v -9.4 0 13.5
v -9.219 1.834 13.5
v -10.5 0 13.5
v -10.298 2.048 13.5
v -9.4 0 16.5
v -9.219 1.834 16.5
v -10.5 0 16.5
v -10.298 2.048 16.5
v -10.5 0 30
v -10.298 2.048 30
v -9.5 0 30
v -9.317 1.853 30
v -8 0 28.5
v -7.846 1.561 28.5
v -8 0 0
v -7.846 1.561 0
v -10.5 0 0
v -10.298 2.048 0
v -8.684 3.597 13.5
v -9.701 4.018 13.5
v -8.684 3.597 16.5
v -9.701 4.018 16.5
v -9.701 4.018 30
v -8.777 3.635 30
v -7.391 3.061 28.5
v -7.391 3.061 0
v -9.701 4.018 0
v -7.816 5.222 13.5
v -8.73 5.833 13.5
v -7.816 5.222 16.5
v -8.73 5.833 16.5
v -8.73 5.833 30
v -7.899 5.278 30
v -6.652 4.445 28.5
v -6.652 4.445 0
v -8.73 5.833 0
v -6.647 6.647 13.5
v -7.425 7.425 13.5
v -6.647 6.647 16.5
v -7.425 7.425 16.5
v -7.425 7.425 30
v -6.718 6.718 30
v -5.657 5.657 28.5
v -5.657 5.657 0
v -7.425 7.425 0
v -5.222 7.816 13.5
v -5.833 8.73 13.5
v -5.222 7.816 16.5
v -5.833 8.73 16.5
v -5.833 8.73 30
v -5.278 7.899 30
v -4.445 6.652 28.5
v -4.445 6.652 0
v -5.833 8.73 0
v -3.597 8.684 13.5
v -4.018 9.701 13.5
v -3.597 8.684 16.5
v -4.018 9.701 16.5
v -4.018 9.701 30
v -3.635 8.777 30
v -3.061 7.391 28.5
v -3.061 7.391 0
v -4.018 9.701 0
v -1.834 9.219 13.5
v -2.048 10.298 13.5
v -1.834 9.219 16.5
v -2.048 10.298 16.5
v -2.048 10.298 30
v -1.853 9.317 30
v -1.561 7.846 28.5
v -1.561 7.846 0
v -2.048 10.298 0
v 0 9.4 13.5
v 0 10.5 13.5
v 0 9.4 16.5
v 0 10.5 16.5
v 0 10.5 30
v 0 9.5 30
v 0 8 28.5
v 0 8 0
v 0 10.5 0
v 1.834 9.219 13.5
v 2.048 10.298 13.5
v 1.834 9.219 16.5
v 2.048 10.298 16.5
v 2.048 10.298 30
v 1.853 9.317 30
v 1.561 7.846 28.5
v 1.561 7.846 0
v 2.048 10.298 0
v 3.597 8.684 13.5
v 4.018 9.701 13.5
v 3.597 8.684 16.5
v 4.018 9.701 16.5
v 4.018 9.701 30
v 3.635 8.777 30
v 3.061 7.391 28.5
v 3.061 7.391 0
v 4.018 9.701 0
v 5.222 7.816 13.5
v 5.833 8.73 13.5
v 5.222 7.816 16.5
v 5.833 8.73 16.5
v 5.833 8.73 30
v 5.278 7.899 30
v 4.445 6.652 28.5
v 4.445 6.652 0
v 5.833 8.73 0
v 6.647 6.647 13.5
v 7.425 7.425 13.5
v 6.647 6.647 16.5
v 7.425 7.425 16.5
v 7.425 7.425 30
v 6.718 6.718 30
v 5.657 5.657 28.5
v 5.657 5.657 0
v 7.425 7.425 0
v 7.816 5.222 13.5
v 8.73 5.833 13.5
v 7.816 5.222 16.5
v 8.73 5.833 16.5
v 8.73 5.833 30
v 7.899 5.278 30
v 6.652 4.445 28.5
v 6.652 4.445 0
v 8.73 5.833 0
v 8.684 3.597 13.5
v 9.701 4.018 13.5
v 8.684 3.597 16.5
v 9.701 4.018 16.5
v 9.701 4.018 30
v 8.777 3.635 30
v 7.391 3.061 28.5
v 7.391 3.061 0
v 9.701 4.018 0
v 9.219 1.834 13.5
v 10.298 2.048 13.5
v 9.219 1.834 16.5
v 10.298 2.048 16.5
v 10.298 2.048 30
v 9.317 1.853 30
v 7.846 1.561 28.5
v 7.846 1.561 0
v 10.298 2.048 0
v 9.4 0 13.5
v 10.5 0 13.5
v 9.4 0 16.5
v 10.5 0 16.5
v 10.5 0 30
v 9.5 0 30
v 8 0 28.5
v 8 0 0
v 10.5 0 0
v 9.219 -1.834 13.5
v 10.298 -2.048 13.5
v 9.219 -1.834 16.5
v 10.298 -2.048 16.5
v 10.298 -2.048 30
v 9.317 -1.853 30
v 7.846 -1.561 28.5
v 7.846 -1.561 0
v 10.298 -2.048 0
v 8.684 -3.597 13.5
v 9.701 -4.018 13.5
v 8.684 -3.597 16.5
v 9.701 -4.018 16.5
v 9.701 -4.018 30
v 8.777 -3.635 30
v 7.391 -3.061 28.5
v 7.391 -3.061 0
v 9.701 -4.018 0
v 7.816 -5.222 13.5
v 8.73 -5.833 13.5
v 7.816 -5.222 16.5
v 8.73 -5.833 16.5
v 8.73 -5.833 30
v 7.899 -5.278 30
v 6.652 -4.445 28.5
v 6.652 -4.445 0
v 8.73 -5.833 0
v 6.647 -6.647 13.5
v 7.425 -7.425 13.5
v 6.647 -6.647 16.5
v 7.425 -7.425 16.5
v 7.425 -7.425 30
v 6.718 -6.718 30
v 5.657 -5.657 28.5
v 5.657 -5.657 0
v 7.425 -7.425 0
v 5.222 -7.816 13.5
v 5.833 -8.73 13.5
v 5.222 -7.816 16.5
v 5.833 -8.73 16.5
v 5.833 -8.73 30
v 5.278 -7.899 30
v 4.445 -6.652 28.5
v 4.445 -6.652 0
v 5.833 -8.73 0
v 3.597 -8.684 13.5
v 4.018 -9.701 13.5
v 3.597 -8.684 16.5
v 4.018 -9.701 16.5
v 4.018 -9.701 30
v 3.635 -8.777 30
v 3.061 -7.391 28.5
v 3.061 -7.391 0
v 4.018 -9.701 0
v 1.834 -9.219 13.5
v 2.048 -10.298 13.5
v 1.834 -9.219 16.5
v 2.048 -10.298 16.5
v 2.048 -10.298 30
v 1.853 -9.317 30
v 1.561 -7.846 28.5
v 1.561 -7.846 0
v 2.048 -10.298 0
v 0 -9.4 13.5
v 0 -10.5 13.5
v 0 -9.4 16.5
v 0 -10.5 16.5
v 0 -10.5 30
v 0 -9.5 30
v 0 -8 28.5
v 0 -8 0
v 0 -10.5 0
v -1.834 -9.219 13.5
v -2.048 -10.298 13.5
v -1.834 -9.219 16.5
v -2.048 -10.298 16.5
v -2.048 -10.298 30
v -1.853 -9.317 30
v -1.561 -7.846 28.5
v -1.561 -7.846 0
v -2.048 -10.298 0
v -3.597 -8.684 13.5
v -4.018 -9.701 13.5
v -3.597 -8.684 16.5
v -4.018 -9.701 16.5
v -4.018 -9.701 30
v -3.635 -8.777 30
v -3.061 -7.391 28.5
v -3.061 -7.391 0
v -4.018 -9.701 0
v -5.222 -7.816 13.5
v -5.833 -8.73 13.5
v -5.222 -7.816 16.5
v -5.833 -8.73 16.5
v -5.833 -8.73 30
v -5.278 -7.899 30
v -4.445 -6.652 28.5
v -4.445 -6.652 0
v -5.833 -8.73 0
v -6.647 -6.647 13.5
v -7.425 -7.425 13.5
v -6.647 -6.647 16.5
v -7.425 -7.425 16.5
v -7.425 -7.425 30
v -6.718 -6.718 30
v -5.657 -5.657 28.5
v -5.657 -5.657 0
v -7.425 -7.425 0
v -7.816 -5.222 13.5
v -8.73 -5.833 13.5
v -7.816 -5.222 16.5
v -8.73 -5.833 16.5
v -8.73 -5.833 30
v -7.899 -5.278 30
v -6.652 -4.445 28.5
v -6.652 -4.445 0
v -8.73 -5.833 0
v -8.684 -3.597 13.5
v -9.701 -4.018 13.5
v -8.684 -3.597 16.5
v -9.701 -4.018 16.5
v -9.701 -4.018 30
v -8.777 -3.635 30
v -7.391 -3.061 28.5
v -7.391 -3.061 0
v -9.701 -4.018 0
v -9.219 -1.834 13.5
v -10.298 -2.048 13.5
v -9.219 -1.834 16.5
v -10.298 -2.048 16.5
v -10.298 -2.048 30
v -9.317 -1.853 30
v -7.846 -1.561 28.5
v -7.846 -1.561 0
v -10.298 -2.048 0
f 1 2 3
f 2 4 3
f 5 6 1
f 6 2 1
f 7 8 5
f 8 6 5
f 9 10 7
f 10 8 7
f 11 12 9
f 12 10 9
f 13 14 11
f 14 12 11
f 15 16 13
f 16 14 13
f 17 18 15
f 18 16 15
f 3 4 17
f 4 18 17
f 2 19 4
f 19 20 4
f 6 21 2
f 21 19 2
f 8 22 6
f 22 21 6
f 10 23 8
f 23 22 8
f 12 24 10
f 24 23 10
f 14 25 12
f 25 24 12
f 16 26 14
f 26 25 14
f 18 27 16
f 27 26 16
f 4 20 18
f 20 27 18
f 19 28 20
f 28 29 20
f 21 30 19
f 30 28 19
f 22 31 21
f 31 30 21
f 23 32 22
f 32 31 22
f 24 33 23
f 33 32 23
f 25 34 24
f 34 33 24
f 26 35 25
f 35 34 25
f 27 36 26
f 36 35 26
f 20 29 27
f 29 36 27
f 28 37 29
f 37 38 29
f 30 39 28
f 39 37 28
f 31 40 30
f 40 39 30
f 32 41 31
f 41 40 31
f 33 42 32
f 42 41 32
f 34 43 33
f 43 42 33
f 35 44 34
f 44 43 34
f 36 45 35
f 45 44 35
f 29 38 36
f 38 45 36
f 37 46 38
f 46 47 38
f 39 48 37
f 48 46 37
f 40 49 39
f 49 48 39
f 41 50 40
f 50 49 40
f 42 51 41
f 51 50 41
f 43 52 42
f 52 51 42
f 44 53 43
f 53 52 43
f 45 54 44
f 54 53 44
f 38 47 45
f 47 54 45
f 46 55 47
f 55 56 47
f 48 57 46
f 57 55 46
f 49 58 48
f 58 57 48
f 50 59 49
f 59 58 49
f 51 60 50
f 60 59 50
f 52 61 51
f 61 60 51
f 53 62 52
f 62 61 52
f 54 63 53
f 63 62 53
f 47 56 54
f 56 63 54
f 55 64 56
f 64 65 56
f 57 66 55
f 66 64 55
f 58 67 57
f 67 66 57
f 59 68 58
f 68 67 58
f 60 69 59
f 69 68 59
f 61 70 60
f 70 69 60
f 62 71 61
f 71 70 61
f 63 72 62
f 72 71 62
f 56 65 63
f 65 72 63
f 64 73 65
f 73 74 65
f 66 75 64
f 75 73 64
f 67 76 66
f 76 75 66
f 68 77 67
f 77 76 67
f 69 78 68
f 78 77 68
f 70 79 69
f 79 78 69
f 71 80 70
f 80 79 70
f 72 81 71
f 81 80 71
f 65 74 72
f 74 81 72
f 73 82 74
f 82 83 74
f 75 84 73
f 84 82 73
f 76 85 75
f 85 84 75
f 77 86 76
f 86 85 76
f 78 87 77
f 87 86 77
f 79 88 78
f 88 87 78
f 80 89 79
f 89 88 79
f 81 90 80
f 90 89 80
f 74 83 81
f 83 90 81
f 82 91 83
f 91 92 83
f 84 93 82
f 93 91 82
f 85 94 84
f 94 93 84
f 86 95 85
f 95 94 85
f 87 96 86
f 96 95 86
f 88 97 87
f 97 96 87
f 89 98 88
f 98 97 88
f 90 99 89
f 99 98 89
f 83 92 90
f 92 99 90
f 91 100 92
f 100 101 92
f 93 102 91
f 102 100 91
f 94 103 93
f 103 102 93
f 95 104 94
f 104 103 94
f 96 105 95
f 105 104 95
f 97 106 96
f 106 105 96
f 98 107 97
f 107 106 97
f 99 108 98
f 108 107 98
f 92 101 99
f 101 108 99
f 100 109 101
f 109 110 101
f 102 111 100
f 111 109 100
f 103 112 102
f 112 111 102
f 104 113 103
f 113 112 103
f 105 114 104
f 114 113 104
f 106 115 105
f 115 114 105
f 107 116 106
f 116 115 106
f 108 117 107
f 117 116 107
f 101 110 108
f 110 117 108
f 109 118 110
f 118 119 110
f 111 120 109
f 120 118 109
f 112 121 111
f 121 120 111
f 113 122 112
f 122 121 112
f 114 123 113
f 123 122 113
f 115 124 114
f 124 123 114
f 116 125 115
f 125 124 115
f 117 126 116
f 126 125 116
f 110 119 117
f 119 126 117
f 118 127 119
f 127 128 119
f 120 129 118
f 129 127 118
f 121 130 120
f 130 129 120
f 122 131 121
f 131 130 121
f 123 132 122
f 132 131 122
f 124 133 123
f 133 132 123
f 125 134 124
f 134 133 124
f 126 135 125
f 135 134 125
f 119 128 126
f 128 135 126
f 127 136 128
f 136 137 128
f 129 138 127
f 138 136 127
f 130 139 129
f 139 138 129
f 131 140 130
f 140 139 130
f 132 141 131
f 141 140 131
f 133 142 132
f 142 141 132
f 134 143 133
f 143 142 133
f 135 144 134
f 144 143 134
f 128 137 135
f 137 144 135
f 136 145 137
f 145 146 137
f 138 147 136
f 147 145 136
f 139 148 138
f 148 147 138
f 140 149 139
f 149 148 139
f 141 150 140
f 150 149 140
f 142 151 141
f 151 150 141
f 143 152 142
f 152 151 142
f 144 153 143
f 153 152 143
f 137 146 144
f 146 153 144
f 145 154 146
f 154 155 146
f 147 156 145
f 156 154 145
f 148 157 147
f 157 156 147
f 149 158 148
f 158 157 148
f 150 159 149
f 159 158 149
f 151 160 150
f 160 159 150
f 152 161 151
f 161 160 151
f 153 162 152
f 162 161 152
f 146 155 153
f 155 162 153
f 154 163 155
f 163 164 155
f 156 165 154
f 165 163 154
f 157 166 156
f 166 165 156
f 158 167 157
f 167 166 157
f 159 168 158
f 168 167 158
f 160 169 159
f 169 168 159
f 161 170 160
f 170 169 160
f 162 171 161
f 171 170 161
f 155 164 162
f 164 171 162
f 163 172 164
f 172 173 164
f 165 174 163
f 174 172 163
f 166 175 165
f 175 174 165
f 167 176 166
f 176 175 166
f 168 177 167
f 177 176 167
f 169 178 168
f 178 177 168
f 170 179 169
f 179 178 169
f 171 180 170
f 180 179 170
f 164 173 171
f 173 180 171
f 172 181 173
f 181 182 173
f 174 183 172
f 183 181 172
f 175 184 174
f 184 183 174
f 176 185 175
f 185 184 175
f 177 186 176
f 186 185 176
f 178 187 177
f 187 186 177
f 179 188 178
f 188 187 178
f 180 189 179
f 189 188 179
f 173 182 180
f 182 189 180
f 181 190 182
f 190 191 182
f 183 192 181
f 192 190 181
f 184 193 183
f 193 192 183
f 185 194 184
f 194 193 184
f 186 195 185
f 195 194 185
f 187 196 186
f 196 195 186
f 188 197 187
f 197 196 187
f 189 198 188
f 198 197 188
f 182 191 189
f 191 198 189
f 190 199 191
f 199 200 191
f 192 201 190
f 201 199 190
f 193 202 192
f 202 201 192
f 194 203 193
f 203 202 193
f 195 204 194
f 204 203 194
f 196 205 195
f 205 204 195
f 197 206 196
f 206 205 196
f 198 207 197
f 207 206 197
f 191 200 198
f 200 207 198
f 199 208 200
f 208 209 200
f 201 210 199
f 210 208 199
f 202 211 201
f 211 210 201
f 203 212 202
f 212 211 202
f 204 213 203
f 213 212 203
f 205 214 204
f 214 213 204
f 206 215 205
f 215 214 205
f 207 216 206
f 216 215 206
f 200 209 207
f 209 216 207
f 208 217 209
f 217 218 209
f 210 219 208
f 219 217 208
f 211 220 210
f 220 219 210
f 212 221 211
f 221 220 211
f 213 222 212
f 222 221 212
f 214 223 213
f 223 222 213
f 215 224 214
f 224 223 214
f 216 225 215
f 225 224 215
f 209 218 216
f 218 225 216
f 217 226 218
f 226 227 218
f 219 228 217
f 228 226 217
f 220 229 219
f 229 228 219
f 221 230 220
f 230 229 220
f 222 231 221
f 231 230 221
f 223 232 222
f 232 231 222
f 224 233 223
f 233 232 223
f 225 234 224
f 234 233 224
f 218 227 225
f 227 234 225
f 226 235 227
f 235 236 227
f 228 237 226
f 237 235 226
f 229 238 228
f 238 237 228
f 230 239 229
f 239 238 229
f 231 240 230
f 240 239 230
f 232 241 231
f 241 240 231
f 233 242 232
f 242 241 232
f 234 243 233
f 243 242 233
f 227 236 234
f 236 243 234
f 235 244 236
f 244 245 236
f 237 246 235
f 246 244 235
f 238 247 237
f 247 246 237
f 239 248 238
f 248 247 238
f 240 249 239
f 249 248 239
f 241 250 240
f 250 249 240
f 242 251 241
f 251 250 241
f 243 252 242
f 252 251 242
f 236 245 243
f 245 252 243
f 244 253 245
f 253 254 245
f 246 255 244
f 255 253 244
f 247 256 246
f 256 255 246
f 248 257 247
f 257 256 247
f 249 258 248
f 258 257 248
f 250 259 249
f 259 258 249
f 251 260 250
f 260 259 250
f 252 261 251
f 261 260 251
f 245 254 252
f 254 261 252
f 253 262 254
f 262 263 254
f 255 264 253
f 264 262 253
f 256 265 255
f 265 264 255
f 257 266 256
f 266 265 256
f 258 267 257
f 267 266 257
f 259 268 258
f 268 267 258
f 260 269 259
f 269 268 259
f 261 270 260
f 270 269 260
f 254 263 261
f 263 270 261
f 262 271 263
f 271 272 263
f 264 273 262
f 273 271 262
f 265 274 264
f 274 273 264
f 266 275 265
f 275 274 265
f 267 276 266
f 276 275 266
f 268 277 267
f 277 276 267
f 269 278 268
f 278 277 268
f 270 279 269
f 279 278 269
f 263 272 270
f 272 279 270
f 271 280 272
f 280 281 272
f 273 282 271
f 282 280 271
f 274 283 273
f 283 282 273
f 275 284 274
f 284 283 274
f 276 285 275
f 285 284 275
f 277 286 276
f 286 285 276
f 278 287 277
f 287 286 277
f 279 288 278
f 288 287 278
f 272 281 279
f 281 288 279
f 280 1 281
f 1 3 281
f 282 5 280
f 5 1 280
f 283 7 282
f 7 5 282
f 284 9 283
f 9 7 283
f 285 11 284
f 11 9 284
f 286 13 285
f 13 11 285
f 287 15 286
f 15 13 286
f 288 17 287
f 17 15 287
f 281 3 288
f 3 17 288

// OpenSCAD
$fn = 32;

// ----------------------------------------------------------------------
// Grooved revolve: thread_relief, bore R8
// ----------------------------------------------------------------------

// --- parameters (mm) ---
bore_r = 8;               // bore radius
outer_r = 10.5;           // outer radius of the body
total_h = 30;             // overall height, Z
wall = 2.5;               // radial wall thickness
groove_w = 3;             // groove width
groove_d = 1.1;           // groove depth
grooves = 1;              // number of outer grooves
relief = 1.5;             // thread relief leg at the bore mouth
relief_angle = 45;        // thread relief chamfer angle, degrees

bbox_x = 2 * outer_r;  // full diameter
bore_d = 2 * bore_r;  // bore diameter
body_d = 2 * outer_r;  // body diameter
revolve_angle = 360;  // full turn around the Z axis

profile = [[8, 0], [10.5, 0], [10.5, 13.5], [9.4, 13.5], [9.4, 16.5], [10.5, 16.5], [10.5, 30], [9.5, 30], [8, 28.5]];  // primary outline, 9 points, counter clockwise

// --- the one profile operation ---
rotate_extrude(angle = revolve_angle) polygon(points = profile);
